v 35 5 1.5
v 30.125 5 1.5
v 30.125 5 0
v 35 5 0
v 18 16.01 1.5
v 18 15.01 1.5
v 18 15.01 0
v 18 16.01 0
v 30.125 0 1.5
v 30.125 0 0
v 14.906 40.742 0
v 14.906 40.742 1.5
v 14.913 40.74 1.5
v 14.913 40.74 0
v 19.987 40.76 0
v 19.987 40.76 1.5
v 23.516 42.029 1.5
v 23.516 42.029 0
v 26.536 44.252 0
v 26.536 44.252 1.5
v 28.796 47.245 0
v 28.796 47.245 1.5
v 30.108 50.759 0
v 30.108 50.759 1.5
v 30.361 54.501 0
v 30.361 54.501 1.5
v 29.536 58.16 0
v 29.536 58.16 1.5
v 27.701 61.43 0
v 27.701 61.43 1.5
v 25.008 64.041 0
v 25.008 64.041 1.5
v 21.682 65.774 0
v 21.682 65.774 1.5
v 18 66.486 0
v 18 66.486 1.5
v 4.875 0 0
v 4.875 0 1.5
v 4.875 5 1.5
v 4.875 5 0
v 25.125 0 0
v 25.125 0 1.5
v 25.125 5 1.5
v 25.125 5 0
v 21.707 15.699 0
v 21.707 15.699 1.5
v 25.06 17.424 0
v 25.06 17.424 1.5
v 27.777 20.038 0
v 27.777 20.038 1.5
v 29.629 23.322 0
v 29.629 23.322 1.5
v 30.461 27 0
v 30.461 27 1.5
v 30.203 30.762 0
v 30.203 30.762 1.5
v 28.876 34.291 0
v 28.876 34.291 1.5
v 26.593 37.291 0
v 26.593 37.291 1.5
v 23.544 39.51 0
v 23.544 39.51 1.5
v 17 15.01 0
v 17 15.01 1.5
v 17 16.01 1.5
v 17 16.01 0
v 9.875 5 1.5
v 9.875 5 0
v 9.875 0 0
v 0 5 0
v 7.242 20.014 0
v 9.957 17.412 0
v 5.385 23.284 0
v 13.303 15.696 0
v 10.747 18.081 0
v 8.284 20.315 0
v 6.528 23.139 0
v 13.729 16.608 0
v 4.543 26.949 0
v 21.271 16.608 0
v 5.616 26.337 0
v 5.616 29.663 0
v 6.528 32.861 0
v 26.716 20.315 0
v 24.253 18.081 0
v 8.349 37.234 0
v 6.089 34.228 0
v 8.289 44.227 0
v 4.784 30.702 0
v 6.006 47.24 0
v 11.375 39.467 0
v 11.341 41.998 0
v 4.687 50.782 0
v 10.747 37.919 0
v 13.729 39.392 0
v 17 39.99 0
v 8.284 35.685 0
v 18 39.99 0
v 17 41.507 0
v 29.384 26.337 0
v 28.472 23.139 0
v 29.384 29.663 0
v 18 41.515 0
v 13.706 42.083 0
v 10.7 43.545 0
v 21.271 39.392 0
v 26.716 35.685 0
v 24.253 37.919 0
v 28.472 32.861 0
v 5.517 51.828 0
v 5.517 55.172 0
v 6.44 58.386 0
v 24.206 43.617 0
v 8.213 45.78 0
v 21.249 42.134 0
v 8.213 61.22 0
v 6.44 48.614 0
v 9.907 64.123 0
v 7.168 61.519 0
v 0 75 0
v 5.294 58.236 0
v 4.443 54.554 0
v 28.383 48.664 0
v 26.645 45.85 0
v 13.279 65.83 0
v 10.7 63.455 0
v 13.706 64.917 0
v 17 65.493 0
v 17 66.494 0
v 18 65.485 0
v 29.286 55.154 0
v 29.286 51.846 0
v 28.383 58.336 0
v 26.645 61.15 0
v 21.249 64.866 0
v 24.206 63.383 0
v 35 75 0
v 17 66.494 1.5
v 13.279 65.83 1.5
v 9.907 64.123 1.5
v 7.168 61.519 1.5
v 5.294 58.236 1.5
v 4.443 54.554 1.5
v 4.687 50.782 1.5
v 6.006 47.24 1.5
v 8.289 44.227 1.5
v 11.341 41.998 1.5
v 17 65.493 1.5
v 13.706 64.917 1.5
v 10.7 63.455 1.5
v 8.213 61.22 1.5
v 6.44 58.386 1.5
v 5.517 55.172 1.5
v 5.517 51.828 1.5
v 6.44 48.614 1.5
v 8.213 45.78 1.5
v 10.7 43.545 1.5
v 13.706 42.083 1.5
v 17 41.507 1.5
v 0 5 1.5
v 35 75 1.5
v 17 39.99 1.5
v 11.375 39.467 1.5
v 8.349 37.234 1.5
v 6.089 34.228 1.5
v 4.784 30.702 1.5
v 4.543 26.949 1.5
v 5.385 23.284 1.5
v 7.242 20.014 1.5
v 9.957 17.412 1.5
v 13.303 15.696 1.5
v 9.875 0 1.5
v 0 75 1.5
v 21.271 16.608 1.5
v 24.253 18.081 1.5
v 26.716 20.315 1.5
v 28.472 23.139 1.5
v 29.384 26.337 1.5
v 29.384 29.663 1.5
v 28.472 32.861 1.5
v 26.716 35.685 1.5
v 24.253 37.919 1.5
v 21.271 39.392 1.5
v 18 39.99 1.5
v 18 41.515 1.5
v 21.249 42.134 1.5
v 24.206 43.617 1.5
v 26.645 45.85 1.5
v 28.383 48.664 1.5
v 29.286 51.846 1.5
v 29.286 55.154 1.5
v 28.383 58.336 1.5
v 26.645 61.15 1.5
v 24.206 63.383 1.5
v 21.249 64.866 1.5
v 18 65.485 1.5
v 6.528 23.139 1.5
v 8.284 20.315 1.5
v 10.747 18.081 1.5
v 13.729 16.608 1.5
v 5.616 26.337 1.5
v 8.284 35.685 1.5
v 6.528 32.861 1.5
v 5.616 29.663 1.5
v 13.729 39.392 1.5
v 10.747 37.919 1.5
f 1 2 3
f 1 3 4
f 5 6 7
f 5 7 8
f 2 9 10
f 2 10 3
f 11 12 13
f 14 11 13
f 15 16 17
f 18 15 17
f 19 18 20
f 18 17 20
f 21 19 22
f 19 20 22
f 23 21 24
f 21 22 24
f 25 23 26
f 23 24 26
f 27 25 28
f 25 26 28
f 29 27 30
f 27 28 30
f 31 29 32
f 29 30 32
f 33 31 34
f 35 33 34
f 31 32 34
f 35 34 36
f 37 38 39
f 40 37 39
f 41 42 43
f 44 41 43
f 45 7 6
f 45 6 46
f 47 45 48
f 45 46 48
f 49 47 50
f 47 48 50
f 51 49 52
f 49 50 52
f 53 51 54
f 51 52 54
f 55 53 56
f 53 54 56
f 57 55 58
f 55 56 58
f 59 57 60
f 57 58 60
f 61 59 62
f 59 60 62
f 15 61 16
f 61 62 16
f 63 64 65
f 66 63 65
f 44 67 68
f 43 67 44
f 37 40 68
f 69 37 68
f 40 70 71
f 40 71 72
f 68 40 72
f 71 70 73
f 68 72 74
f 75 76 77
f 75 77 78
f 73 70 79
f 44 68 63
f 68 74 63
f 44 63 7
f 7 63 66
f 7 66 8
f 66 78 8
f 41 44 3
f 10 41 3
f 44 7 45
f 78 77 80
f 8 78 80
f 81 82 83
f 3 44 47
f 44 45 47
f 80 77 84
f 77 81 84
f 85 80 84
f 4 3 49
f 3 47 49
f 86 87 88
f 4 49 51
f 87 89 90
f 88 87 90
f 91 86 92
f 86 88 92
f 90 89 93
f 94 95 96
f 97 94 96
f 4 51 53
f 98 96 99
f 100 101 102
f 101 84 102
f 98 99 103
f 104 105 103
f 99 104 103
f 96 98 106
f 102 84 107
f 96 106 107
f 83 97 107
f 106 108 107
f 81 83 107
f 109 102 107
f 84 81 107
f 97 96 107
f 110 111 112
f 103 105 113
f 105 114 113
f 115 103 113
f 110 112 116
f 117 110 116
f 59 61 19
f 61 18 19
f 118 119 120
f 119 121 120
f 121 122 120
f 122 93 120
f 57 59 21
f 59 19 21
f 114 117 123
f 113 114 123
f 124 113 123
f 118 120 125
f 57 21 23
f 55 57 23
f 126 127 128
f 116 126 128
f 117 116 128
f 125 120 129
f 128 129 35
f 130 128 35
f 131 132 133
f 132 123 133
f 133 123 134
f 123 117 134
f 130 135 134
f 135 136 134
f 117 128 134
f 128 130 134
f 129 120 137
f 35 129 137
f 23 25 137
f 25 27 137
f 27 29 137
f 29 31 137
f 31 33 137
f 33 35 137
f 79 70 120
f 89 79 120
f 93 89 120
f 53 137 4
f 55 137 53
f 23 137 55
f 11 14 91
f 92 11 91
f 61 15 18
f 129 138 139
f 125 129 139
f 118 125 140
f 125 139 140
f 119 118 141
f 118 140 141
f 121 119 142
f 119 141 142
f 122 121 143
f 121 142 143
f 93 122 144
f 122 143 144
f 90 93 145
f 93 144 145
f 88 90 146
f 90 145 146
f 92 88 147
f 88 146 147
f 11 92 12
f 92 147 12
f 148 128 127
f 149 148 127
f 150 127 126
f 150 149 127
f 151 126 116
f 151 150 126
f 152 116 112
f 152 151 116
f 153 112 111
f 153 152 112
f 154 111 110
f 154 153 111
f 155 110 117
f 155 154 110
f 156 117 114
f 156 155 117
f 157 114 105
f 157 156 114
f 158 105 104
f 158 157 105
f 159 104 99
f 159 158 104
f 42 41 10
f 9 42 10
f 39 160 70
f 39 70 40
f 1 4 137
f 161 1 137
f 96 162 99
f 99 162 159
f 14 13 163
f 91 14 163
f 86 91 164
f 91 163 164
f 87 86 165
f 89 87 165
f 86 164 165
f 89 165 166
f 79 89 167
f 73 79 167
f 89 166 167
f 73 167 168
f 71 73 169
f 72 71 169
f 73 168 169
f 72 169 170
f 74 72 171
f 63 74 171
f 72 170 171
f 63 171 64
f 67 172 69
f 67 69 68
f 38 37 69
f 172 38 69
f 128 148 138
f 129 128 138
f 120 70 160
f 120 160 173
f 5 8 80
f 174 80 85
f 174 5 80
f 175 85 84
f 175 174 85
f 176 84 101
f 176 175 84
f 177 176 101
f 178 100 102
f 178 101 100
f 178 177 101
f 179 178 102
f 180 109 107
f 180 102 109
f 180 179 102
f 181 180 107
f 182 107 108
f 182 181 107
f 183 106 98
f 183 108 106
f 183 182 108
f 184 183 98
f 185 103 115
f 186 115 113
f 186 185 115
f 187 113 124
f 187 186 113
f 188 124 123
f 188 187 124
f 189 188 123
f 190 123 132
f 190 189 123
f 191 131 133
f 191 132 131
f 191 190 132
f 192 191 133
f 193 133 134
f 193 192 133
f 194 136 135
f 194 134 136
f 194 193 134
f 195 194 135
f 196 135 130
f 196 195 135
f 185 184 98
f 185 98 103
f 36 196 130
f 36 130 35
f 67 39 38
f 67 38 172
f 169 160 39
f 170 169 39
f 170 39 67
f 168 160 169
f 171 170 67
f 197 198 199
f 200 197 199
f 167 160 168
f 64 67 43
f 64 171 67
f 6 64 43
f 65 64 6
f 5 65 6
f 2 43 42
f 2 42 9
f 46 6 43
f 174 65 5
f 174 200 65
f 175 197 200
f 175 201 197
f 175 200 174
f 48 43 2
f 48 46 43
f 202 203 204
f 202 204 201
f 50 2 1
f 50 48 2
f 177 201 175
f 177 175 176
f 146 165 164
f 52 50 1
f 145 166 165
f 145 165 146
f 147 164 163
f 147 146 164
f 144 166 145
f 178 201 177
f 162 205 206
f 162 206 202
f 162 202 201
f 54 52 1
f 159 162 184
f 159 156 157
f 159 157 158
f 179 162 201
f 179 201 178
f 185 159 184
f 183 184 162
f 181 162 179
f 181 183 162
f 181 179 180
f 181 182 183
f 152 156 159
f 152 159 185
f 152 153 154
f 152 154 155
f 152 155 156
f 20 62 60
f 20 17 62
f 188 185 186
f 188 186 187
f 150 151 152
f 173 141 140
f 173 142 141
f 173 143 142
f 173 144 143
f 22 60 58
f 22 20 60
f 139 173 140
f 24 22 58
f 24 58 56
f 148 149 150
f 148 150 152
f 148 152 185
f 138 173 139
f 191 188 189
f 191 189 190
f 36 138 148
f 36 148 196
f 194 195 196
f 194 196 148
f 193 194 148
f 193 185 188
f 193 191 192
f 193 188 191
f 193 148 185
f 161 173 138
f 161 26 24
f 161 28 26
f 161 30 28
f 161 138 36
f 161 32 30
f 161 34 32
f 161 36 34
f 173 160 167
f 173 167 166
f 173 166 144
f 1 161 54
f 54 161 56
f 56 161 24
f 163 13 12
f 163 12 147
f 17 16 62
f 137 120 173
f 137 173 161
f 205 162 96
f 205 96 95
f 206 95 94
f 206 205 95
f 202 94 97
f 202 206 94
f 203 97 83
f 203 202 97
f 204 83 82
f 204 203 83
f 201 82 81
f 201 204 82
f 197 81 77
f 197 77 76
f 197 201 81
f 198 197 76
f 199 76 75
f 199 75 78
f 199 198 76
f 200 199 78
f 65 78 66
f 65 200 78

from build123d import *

# Parameters (mm, degrees)
SKIZZE1_W                        = 35
SKIZZE1_H                        = 75
AUFSATZ_LINEAR_AUSTRAGEN1_DEPTH  = 1.5
SKIZZE3_W                        = 15.25
SKIZZE3_H                        = 5
SKIZZE3_W_2                      = 4.875
SCHNITT_LINEAR_AUSTRAGEN12_DEPTH = 20
SKIZZE13_R                       = 12
SCHNITT_LINEAR_AUSTRAGEN18_DEPTH = 1.5
SKIZZE14_W                       = 1
SKIZZE14_H                       = 57.312152727
AUFSATZ_LINEAR_AUSTRAGEN8_DEPTH  = 1.5


with BuildPart() as part:
    # Skizze1 → Aufsatz-Linear austragen1 (new body)
    with BuildSketch(Plane.XY):
        with Locations((17.5, 37.5)):
            Rectangle(SKIZZE1_W, SKIZZE1_H)
    extrude(amount=AUFSATZ_LINEAR_AUSTRAGEN1_DEPTH)

    # Skizze3 → Schnitt-Linear austragen12 (cut)
    with BuildSketch(Plane.XY.offset(1.5)):
        with Locations((17.5, 2.5)):
            Rectangle(SKIZZE3_W, SKIZZE3_H)
        with Locations((32.5625, 2.5)):
            Rectangle(SKIZZE3_W_2, SKIZZE3_H)
        with Locations((2.4375, 2.5)):
            Rectangle(SKIZZE3_W_2, SKIZZE3_H)
    extrude(amount=-SCHNITT_LINEAR_AUSTRAGEN12_DEPTH, mode=Mode.SUBTRACT)

    # Skizze13 → Schnitt-Linear austragen18 (cut)
    with BuildSketch(Plane.XY.offset(1.5)):
        with BuildLine():
            Line((14.905768525, 40.7415201), (14.913283553, 40.740050943))
            ThreePointArc((14.913283553, 40.740050943), (17.550982946, 15.000099972), (19.986710673, 40.759947885))
            ThreePointArc((19.986710673, 40.759947885), (17.352851338, 66.4999145), (14.905768525, 40.7415201))
        make_face()
        with Locations((17.4, 53.5)):
            Circle(SKIZZE13_R, mode=Mode.SUBTRACT)
        with Locations((17.5, 28)):
            Circle(SKIZZE13_R, mode=Mode.SUBTRACT)
    extrude(amount=-SCHNITT_LINEAR_AUSTRAGEN18_DEPTH, mode=Mode.SUBTRACT)


with BuildPart() as schnitt_linear_austragen18_piece_1:
    # of the separate pieces the step leaves, piece 1, a body of its own (schnitt_linear_austragen18_pieces)
    add(part.part.solids().sort_by_distance((4.875, 0, 0))[0])



with BuildPart() as schnitt_linear_austragen18_piece_2:
    # of the separate pieces the step leaves, piece 2, a body of its own (schnitt_linear_austragen18_pieces)
    add(part.part.solids().sort_by_distance((29.4, 53.5, 0))[0])


with BuildPart() as schnitt_linear_austragen18_piece_3:
    # of the separate pieces the step leaves, piece 3, a body of its own (schnitt_linear_austragen18_pieces)
    add(part.part.solids().sort_by_distance((29.5, 28, 0))[0])


with BuildPart() as schnitt_linear_austragen18_piece_1_1:
    add(schnitt_linear_austragen18_piece_1.part)

    add(schnitt_linear_austragen18_piece_2.part)  # Aufsatz-Linear austragen8 merges Schnitt-Linear austragen18 piece 2

    add(schnitt_linear_austragen18_piece_3.part)  # Aufsatz-Linear austragen8 merges Schnitt-Linear austragen18 piece 3
    # Skizze14 → Aufsatz-Linear austragen8 (add)
    with BuildSketch(Plane.XY.offset(1.5)):
        with Locations((17.5, 39.529651928)):
            Rectangle(SKIZZE14_W, SKIZZE14_H)
    extrude(amount=-AUFSATZ_LINEAR_AUSTRAGEN8_DEPTH)


solid = schnitt_linear_austragen18_piece_1_1.part
